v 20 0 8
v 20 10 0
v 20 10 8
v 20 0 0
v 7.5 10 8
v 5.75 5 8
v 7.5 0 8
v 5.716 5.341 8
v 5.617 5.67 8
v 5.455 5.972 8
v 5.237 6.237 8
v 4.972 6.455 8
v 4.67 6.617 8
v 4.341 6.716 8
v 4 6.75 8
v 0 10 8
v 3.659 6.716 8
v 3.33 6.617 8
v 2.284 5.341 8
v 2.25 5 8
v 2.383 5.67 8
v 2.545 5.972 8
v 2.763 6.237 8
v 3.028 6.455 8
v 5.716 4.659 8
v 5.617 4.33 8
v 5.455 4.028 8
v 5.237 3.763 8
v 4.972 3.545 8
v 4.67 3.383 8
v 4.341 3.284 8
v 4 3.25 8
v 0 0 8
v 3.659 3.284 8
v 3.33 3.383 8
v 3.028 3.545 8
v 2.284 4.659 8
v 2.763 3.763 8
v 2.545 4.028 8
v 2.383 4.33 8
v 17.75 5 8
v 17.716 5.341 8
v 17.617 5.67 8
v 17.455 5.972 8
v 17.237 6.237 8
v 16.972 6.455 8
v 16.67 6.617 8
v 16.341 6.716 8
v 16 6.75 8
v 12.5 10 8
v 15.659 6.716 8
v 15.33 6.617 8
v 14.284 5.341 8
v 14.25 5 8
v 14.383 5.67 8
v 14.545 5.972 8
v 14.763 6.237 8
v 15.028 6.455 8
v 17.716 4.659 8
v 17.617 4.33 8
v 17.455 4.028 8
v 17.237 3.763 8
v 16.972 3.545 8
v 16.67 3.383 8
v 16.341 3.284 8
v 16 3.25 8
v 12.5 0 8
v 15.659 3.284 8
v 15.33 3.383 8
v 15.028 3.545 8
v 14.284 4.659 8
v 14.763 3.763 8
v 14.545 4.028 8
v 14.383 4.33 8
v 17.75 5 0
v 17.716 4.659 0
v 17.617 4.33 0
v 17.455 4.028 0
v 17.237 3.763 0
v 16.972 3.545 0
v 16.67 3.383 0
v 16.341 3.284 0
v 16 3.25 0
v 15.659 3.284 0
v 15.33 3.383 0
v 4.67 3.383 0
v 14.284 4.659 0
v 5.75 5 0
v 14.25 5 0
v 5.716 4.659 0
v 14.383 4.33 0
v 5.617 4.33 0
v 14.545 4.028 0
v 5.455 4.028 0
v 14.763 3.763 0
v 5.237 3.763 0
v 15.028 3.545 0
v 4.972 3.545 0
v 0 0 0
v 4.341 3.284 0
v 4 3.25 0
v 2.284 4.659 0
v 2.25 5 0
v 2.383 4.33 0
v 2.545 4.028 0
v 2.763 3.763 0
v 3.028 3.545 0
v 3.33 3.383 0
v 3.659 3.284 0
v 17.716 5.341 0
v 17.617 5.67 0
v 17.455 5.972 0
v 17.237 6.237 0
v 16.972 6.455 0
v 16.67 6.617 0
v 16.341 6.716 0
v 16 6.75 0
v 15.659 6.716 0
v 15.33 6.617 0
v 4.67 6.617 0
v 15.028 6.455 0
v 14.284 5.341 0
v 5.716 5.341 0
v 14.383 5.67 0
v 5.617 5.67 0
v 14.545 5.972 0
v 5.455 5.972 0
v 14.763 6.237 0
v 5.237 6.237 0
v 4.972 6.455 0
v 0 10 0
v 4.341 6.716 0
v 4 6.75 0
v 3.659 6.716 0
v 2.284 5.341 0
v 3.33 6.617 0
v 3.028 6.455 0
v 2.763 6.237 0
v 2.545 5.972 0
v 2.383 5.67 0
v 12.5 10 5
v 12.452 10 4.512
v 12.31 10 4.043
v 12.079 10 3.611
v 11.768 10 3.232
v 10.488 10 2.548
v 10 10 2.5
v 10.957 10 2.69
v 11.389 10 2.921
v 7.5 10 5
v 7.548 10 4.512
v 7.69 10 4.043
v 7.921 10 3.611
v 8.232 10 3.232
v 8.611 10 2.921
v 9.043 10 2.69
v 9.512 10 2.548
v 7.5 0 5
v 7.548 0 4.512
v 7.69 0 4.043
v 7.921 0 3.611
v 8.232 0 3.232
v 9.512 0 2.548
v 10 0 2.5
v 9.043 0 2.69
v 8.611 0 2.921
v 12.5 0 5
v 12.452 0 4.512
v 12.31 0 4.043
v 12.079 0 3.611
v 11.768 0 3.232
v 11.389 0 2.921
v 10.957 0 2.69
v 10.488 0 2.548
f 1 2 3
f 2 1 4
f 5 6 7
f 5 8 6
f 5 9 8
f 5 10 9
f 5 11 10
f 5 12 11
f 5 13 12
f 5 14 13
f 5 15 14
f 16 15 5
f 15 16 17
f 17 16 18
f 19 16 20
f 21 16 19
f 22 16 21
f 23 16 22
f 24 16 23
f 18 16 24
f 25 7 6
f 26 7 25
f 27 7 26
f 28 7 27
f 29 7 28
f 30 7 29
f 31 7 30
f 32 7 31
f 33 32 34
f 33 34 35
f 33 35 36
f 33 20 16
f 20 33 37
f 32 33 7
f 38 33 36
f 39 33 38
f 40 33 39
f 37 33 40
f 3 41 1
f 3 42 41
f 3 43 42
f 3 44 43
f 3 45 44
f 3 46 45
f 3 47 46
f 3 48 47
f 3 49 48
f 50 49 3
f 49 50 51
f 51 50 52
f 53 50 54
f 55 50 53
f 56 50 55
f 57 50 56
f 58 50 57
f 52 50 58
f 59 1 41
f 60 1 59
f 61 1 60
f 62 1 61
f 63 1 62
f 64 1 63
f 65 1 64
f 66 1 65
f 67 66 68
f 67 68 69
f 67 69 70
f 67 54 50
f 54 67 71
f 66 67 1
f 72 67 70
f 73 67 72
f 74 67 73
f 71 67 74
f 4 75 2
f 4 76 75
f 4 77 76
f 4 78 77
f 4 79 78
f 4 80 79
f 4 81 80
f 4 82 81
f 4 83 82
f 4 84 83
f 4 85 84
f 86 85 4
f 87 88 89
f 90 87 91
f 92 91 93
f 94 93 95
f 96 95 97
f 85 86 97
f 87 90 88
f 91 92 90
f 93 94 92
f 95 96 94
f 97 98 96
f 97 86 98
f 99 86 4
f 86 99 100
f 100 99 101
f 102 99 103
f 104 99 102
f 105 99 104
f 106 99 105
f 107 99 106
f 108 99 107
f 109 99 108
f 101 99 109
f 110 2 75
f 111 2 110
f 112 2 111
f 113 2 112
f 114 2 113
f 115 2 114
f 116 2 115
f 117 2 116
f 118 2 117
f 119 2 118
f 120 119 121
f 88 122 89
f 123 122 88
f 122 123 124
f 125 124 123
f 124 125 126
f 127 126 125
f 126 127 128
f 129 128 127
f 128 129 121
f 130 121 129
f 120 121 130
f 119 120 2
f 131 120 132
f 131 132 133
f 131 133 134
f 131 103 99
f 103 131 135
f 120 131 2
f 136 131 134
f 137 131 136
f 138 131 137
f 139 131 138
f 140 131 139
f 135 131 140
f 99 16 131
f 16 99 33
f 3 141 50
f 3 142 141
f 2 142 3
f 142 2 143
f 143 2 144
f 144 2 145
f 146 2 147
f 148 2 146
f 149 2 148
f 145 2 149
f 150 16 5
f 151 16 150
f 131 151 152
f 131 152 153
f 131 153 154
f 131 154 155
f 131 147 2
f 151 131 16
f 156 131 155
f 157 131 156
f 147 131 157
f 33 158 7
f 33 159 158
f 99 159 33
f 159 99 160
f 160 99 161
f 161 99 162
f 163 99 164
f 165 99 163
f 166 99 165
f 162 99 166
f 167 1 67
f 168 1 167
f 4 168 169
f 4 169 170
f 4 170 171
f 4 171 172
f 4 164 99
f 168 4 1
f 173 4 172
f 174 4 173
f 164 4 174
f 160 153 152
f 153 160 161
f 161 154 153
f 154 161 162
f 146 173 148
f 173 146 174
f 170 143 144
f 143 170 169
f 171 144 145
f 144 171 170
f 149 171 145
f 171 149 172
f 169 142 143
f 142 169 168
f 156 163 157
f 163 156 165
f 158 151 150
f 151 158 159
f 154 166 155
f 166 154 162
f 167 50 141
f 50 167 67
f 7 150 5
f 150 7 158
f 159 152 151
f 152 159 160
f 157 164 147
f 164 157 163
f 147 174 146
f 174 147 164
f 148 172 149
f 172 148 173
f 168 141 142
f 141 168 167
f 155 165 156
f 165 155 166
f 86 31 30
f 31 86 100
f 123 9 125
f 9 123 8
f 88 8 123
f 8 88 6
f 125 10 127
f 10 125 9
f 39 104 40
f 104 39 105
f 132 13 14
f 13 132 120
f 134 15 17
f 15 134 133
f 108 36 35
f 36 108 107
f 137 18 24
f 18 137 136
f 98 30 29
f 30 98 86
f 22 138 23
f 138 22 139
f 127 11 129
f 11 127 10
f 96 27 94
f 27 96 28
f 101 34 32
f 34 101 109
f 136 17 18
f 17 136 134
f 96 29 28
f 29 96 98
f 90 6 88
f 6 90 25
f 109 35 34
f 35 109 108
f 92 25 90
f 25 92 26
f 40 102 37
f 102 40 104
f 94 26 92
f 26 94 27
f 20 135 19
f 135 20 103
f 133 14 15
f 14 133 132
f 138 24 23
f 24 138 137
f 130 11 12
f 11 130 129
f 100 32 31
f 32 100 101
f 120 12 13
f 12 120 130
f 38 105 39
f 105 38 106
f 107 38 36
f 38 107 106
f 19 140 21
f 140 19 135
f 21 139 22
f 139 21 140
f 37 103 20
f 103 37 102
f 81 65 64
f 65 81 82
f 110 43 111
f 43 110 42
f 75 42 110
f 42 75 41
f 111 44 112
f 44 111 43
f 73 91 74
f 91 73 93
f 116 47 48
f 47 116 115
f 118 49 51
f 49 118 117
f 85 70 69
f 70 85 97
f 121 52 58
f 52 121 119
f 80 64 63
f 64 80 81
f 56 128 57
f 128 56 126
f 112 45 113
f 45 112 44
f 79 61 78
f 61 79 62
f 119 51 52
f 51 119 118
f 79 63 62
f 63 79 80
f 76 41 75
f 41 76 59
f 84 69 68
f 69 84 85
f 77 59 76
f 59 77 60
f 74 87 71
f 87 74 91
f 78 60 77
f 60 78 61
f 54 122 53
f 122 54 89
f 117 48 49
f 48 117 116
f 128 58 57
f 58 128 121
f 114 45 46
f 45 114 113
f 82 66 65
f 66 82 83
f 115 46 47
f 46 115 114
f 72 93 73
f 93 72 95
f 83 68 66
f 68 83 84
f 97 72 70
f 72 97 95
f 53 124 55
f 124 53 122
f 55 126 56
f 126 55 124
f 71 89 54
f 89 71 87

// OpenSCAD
$fn=32;
difference(){
cube([20,10,8]);
hull(){
translate([10,11,3+2])
rotate([90,0,0])
cylinder(d=5,h=12);
translate([10,11,3+2+5])
rotate([90,0,0])
cylinder(d=5,h=12);
}
translate([4,5,-2])
cylinder(d=3.5,h=12);
translate([4+12,5,-2])
cylinder(d=3.5,h=12);
}
